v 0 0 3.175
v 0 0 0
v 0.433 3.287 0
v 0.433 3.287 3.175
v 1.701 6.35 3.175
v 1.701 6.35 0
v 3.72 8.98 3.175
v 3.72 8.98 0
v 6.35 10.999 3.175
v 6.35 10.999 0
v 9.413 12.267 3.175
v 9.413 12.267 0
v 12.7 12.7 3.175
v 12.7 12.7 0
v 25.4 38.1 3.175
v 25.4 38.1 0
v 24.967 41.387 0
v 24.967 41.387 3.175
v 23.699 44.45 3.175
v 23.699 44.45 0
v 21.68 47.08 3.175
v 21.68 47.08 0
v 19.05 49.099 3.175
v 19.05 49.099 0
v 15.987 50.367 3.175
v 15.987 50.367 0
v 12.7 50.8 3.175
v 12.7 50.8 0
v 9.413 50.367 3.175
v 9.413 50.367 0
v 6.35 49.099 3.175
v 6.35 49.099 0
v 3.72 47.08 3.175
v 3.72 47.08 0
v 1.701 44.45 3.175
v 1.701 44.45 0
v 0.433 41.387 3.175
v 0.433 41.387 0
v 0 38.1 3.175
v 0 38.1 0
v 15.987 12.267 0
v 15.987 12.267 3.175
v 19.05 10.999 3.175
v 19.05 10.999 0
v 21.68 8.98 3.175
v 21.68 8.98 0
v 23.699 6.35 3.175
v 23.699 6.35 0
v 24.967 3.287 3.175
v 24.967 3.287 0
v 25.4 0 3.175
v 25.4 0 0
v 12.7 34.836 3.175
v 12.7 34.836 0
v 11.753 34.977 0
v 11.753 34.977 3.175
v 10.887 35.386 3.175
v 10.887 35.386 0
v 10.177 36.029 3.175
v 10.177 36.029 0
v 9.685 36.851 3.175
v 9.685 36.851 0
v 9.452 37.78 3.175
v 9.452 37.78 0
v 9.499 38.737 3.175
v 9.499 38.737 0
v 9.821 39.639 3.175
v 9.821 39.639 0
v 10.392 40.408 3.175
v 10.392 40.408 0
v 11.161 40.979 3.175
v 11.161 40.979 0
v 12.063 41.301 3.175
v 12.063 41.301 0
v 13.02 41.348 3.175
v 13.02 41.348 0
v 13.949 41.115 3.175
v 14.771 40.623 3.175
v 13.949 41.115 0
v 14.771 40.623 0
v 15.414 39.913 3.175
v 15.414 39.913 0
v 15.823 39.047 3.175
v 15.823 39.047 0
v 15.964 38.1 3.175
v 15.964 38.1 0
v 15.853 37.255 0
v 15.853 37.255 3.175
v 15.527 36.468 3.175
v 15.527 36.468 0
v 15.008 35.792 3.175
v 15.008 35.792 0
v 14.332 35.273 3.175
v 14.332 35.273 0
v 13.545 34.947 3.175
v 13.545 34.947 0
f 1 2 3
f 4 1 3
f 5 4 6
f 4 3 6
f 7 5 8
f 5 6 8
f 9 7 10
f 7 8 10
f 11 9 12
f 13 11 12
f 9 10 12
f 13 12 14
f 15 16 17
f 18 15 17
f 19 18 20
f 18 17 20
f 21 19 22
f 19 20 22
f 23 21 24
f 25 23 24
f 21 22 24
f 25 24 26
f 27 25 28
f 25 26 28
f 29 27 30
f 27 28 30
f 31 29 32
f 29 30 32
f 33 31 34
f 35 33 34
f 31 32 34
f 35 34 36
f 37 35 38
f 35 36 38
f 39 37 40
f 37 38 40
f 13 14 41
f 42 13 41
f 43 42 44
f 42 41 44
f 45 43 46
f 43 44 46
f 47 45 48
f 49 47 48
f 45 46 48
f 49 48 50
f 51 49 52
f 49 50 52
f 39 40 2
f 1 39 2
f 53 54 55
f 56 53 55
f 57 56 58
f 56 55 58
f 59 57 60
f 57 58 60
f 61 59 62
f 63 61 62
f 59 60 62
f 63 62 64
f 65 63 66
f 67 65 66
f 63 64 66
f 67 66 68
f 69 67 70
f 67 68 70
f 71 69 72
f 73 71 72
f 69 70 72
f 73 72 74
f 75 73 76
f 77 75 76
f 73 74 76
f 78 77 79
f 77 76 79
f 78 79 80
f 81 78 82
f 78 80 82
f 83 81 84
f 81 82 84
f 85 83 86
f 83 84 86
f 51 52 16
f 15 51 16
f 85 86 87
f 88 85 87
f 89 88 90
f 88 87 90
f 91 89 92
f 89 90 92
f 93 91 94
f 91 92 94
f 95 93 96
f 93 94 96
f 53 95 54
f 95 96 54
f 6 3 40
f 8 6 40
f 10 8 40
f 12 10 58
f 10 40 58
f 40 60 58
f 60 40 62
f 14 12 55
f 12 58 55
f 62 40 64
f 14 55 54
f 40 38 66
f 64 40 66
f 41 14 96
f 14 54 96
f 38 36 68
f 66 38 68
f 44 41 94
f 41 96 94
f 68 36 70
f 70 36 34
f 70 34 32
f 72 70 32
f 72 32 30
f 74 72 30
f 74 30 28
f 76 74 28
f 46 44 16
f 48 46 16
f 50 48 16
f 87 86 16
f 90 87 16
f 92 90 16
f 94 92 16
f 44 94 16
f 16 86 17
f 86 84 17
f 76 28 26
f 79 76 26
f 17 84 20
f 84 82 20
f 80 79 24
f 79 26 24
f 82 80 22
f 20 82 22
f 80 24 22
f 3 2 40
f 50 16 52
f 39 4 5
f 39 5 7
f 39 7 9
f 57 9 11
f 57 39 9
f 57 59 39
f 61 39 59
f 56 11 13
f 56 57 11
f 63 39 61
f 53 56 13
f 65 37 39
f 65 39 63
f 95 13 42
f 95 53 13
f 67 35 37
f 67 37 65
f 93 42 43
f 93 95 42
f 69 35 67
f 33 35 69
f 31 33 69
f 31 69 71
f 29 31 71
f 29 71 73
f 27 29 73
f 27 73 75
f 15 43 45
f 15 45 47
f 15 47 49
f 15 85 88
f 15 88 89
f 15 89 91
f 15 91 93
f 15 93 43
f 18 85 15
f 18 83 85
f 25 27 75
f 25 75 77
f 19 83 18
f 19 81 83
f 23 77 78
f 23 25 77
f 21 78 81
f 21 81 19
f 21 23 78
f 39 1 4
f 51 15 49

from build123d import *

# Parameters (mm, degrees)
BOSS_EXTRUDE1_DEPTH = 3.175


with BuildPart() as part:
    # Sketch1 → Boss-Extrude1 (new body)
    with BuildSketch(Plane.XY):
        with BuildLine():
            Line((0, 38.1), (0, 0))
            ThreePointArc((0, 0), (3.719743879, 8.980256121), (12.7, 12.7))
            ThreePointArc((12.7, 12.7), (21.680256121, 8.980256121), (25.4, 0))
            Line((25.4, 0), (25.4, 38.1))
            ThreePointArc((25.4, 38.1), (12.7, 50.8), (0, 38.1))
        make_face()
        with BuildLine():
            ThreePointArc((15.9639, 38.1), (15.007925823, 35.792074177), (12.7, 34.8361))
            ThreePointArc((12.7, 34.8361), (10.392074177, 40.407925823), (15.9639, 38.1))
        make_face(mode=Mode.SUBTRACT)
    extrude(amount=BOSS_EXTRUDE1_DEPTH)


solid = part.part
